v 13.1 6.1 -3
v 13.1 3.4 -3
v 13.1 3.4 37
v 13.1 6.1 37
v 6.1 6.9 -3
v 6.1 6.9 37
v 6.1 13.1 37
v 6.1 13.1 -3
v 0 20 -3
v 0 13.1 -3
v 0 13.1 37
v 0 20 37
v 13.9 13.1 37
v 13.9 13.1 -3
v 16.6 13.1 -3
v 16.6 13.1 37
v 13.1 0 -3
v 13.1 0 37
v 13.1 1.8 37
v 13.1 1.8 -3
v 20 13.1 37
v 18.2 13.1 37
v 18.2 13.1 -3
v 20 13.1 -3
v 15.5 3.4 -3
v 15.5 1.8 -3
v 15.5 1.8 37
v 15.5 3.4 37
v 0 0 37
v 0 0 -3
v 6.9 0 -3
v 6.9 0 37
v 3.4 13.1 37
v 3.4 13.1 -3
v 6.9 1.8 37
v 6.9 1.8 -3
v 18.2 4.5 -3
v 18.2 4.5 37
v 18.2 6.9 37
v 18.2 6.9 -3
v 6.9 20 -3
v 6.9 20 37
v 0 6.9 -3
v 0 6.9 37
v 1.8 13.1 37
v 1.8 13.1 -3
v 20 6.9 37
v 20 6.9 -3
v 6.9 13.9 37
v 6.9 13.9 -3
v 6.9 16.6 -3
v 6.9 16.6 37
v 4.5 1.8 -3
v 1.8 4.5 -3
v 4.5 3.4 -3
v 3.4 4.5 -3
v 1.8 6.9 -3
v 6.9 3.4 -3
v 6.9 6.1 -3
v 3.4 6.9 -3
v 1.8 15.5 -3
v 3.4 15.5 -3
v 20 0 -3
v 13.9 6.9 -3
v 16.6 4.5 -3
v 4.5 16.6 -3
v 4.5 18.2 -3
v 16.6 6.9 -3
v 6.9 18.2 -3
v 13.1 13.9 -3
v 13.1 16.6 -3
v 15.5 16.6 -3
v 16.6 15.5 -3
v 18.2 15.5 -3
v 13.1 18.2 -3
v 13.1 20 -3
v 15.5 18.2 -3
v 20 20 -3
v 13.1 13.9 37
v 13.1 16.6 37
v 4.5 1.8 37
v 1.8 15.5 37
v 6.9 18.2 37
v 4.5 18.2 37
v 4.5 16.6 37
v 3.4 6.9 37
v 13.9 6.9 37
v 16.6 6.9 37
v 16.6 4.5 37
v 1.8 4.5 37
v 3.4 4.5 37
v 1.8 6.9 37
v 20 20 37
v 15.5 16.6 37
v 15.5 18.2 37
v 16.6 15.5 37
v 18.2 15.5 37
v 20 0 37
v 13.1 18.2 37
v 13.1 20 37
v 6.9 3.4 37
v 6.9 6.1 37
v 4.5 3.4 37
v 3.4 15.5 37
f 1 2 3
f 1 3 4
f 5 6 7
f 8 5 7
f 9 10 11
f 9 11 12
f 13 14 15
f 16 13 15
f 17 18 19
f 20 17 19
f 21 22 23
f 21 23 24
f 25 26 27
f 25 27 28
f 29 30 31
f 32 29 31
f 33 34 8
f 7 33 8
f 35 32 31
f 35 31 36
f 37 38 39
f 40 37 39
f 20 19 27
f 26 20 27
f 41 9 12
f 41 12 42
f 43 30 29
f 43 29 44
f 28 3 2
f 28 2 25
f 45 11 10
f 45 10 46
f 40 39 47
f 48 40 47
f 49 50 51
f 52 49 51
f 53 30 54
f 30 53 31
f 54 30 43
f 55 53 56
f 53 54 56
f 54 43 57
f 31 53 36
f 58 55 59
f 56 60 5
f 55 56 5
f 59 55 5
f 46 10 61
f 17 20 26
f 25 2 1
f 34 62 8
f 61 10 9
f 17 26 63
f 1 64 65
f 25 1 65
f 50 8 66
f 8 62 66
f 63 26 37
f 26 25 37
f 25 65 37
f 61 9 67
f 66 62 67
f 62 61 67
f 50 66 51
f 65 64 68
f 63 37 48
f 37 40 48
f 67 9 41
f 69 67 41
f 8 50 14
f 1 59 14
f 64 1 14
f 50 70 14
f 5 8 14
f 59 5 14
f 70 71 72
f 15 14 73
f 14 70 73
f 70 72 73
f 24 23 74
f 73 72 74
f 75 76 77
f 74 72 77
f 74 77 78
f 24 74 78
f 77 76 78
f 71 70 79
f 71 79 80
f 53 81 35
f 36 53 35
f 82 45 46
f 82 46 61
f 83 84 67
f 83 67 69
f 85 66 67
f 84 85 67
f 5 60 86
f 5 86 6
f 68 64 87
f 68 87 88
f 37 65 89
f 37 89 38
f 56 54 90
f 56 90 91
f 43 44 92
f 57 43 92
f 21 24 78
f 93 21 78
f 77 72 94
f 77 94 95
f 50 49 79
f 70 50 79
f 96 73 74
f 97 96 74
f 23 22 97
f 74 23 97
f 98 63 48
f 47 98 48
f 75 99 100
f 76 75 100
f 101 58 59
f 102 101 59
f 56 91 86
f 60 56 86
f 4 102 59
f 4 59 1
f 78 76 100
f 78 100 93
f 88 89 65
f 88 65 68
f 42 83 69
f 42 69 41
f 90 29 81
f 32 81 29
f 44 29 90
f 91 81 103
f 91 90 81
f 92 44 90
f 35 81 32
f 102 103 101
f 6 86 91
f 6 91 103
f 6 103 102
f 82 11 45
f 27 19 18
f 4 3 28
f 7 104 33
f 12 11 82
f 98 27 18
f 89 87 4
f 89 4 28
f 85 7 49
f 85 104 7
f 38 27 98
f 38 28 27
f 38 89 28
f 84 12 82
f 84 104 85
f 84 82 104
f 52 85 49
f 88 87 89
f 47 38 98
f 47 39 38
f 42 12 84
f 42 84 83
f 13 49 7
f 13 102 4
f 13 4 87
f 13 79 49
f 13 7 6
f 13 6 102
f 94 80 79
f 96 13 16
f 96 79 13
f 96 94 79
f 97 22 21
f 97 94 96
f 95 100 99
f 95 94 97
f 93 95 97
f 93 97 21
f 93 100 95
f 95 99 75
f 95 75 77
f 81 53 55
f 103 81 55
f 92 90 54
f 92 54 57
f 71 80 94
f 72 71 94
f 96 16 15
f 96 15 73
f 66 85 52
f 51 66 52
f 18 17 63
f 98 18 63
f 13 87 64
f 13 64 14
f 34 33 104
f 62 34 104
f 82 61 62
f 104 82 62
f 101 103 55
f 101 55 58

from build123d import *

# Parameters (mm, degrees)
BOX010_W     = 6.2
BOX010_H     = 6.1
BOX010_DEPTH = 50
BOX009_W     = 6.2
BOX009_H     = 6.1
BOX009_DEPTH = 50
BOX007_W     = 6.1
BOX007_H     = 6.2
BOX007_DEPTH = 50
BOX006_W     = 6.1
BOX006_H     = 6.2
BOX006_DEPTH = 50
BOX005_W     = 11
BOX005_H     = 1.6
BOX005_DEPTH = 50
BOX004_W     = 11
BOX004_H     = 1.6
BOX004_DEPTH = 50
BOX002_W     = 1.6
BOX002_H     = 11
BOX002_DEPTH = 50
BOX001_W     = 1.6
BOX001_H     = 11
BOX001_DEPTH = 52
BOX_W        = 20
BOX_H        = 20
BOX_DEPTH    = 40


with BuildPart() as cube009:
    # Box010 → Box010 (new body)
    with BuildSketch(Plane(origin=(6.9, 13.9, -7), x_dir=(1, 0, 0), z_dir=(0, 0, 1))):
        with Locations((3.1, 3.05)):
            Rectangle(BOX010_W, BOX010_H)
    extrude(amount=BOX010_DEPTH)


with BuildPart() as cube008:
    # Box009 → Box009 (new body)
    with BuildSketch(Plane(origin=(6.9, 0, -7), x_dir=(1, 0, 0), z_dir=(0, 0, 1))):
        with Locations((3.1, 3.05)):
            Rectangle(BOX009_W, BOX009_H)
    extrude(amount=BOX009_DEPTH)


with BuildPart() as cube006:
    # Box007 → Box007 (new body)
    with BuildSketch(Plane(origin=(13.9, 6.9, -7), x_dir=(1, 0, 0), z_dir=(0, 0, 1))):
        with Locations((3.05, 3.1)):
            Rectangle(BOX007_W, BOX007_H)
    extrude(amount=BOX007_DEPTH)


with BuildPart() as cube005:
    # Box006 → Box006 (new body)
    with BuildSketch(Plane(origin=(0, 6.9, -7), x_dir=(1, 0, 0), z_dir=(0, 0, 1))):
        with Locations((3.05, 3.1)):
            Rectangle(BOX006_W, BOX006_H)
    extrude(amount=BOX006_DEPTH)


with BuildPart() as cube004:
    # Box005 → Box005 (new body)
    with BuildSketch(Plane(origin=(4.5, 16.6, -6), x_dir=(1, 0, 0), z_dir=(0, 0, 1))):
        with Locations((5.5, 0.8)):
            Rectangle(BOX005_W, BOX005_H)
    extrude(amount=BOX005_DEPTH)


with BuildPart() as cube003:
    # Box004 → Box004 (new body)
    with BuildSketch(Plane(origin=(4.5, 1.8, -3), x_dir=(1, 0, 0), z_dir=(0, 0, 1))):
        with Locations((5.5, 0.8)):
            Rectangle(BOX004_W, BOX004_H)
    extrude(amount=BOX004_DEPTH)


with BuildPart() as cube001:
    # Box002 → Box002 (new body)
    with BuildSketch(Plane(origin=(16.6, 4.5, -6), x_dir=(1, 0, 0), z_dir=(0, 0, 1))):
        with Locations((0.8, 5.5)):
            Rectangle(BOX002_W, BOX002_H)
    extrude(amount=BOX002_DEPTH)


with BuildPart() as cortador:
    # Box001 → Box001 (new body)
    with BuildSketch(Plane(origin=(1.8, 4.5, -2), x_dir=(1, 0, 0), z_dir=(0, 0, 1))):
        with Locations((0.8, 5.5)):
            Rectangle(BOX001_W, BOX001_H)
    extrude(amount=BOX001_DEPTH)


with BuildPart() as cut007:
    # Box → Box (new body)
    with BuildSketch(Plane.XY):
        with Locations((10, 10)):
            Rectangle(BOX_W, BOX_H)
    extrude(amount=BOX_DEPTH)

    # Cut: cut cortador
    add(cortador.part, mode=Mode.SUBTRACT)


with BuildPart() as cut007_1:
    # Cut placement: moved
    add(cut007.part.moved(Location((0, 0, -3))))

    # Cut001: cut Cube001
    add(cube001.part, mode=Mode.SUBTRACT)

    # Cut002: cut Cube003
    add(cube003.part, mode=Mode.SUBTRACT)

    # Cut003: cut Cube004
    add(cube004.part, mode=Mode.SUBTRACT)

    # Cut004: cut Cube005
    add(cube005.part, mode=Mode.SUBTRACT)

    # Cut005: cut Cube006
    add(cube006.part, mode=Mode.SUBTRACT)

    # Cut006: cut Cube008
    add(cube008.part, mode=Mode.SUBTRACT)

    # Cut007: cut Cube009
    add(cube009.part, mode=Mode.SUBTRACT)


solid = cut007_1.part
